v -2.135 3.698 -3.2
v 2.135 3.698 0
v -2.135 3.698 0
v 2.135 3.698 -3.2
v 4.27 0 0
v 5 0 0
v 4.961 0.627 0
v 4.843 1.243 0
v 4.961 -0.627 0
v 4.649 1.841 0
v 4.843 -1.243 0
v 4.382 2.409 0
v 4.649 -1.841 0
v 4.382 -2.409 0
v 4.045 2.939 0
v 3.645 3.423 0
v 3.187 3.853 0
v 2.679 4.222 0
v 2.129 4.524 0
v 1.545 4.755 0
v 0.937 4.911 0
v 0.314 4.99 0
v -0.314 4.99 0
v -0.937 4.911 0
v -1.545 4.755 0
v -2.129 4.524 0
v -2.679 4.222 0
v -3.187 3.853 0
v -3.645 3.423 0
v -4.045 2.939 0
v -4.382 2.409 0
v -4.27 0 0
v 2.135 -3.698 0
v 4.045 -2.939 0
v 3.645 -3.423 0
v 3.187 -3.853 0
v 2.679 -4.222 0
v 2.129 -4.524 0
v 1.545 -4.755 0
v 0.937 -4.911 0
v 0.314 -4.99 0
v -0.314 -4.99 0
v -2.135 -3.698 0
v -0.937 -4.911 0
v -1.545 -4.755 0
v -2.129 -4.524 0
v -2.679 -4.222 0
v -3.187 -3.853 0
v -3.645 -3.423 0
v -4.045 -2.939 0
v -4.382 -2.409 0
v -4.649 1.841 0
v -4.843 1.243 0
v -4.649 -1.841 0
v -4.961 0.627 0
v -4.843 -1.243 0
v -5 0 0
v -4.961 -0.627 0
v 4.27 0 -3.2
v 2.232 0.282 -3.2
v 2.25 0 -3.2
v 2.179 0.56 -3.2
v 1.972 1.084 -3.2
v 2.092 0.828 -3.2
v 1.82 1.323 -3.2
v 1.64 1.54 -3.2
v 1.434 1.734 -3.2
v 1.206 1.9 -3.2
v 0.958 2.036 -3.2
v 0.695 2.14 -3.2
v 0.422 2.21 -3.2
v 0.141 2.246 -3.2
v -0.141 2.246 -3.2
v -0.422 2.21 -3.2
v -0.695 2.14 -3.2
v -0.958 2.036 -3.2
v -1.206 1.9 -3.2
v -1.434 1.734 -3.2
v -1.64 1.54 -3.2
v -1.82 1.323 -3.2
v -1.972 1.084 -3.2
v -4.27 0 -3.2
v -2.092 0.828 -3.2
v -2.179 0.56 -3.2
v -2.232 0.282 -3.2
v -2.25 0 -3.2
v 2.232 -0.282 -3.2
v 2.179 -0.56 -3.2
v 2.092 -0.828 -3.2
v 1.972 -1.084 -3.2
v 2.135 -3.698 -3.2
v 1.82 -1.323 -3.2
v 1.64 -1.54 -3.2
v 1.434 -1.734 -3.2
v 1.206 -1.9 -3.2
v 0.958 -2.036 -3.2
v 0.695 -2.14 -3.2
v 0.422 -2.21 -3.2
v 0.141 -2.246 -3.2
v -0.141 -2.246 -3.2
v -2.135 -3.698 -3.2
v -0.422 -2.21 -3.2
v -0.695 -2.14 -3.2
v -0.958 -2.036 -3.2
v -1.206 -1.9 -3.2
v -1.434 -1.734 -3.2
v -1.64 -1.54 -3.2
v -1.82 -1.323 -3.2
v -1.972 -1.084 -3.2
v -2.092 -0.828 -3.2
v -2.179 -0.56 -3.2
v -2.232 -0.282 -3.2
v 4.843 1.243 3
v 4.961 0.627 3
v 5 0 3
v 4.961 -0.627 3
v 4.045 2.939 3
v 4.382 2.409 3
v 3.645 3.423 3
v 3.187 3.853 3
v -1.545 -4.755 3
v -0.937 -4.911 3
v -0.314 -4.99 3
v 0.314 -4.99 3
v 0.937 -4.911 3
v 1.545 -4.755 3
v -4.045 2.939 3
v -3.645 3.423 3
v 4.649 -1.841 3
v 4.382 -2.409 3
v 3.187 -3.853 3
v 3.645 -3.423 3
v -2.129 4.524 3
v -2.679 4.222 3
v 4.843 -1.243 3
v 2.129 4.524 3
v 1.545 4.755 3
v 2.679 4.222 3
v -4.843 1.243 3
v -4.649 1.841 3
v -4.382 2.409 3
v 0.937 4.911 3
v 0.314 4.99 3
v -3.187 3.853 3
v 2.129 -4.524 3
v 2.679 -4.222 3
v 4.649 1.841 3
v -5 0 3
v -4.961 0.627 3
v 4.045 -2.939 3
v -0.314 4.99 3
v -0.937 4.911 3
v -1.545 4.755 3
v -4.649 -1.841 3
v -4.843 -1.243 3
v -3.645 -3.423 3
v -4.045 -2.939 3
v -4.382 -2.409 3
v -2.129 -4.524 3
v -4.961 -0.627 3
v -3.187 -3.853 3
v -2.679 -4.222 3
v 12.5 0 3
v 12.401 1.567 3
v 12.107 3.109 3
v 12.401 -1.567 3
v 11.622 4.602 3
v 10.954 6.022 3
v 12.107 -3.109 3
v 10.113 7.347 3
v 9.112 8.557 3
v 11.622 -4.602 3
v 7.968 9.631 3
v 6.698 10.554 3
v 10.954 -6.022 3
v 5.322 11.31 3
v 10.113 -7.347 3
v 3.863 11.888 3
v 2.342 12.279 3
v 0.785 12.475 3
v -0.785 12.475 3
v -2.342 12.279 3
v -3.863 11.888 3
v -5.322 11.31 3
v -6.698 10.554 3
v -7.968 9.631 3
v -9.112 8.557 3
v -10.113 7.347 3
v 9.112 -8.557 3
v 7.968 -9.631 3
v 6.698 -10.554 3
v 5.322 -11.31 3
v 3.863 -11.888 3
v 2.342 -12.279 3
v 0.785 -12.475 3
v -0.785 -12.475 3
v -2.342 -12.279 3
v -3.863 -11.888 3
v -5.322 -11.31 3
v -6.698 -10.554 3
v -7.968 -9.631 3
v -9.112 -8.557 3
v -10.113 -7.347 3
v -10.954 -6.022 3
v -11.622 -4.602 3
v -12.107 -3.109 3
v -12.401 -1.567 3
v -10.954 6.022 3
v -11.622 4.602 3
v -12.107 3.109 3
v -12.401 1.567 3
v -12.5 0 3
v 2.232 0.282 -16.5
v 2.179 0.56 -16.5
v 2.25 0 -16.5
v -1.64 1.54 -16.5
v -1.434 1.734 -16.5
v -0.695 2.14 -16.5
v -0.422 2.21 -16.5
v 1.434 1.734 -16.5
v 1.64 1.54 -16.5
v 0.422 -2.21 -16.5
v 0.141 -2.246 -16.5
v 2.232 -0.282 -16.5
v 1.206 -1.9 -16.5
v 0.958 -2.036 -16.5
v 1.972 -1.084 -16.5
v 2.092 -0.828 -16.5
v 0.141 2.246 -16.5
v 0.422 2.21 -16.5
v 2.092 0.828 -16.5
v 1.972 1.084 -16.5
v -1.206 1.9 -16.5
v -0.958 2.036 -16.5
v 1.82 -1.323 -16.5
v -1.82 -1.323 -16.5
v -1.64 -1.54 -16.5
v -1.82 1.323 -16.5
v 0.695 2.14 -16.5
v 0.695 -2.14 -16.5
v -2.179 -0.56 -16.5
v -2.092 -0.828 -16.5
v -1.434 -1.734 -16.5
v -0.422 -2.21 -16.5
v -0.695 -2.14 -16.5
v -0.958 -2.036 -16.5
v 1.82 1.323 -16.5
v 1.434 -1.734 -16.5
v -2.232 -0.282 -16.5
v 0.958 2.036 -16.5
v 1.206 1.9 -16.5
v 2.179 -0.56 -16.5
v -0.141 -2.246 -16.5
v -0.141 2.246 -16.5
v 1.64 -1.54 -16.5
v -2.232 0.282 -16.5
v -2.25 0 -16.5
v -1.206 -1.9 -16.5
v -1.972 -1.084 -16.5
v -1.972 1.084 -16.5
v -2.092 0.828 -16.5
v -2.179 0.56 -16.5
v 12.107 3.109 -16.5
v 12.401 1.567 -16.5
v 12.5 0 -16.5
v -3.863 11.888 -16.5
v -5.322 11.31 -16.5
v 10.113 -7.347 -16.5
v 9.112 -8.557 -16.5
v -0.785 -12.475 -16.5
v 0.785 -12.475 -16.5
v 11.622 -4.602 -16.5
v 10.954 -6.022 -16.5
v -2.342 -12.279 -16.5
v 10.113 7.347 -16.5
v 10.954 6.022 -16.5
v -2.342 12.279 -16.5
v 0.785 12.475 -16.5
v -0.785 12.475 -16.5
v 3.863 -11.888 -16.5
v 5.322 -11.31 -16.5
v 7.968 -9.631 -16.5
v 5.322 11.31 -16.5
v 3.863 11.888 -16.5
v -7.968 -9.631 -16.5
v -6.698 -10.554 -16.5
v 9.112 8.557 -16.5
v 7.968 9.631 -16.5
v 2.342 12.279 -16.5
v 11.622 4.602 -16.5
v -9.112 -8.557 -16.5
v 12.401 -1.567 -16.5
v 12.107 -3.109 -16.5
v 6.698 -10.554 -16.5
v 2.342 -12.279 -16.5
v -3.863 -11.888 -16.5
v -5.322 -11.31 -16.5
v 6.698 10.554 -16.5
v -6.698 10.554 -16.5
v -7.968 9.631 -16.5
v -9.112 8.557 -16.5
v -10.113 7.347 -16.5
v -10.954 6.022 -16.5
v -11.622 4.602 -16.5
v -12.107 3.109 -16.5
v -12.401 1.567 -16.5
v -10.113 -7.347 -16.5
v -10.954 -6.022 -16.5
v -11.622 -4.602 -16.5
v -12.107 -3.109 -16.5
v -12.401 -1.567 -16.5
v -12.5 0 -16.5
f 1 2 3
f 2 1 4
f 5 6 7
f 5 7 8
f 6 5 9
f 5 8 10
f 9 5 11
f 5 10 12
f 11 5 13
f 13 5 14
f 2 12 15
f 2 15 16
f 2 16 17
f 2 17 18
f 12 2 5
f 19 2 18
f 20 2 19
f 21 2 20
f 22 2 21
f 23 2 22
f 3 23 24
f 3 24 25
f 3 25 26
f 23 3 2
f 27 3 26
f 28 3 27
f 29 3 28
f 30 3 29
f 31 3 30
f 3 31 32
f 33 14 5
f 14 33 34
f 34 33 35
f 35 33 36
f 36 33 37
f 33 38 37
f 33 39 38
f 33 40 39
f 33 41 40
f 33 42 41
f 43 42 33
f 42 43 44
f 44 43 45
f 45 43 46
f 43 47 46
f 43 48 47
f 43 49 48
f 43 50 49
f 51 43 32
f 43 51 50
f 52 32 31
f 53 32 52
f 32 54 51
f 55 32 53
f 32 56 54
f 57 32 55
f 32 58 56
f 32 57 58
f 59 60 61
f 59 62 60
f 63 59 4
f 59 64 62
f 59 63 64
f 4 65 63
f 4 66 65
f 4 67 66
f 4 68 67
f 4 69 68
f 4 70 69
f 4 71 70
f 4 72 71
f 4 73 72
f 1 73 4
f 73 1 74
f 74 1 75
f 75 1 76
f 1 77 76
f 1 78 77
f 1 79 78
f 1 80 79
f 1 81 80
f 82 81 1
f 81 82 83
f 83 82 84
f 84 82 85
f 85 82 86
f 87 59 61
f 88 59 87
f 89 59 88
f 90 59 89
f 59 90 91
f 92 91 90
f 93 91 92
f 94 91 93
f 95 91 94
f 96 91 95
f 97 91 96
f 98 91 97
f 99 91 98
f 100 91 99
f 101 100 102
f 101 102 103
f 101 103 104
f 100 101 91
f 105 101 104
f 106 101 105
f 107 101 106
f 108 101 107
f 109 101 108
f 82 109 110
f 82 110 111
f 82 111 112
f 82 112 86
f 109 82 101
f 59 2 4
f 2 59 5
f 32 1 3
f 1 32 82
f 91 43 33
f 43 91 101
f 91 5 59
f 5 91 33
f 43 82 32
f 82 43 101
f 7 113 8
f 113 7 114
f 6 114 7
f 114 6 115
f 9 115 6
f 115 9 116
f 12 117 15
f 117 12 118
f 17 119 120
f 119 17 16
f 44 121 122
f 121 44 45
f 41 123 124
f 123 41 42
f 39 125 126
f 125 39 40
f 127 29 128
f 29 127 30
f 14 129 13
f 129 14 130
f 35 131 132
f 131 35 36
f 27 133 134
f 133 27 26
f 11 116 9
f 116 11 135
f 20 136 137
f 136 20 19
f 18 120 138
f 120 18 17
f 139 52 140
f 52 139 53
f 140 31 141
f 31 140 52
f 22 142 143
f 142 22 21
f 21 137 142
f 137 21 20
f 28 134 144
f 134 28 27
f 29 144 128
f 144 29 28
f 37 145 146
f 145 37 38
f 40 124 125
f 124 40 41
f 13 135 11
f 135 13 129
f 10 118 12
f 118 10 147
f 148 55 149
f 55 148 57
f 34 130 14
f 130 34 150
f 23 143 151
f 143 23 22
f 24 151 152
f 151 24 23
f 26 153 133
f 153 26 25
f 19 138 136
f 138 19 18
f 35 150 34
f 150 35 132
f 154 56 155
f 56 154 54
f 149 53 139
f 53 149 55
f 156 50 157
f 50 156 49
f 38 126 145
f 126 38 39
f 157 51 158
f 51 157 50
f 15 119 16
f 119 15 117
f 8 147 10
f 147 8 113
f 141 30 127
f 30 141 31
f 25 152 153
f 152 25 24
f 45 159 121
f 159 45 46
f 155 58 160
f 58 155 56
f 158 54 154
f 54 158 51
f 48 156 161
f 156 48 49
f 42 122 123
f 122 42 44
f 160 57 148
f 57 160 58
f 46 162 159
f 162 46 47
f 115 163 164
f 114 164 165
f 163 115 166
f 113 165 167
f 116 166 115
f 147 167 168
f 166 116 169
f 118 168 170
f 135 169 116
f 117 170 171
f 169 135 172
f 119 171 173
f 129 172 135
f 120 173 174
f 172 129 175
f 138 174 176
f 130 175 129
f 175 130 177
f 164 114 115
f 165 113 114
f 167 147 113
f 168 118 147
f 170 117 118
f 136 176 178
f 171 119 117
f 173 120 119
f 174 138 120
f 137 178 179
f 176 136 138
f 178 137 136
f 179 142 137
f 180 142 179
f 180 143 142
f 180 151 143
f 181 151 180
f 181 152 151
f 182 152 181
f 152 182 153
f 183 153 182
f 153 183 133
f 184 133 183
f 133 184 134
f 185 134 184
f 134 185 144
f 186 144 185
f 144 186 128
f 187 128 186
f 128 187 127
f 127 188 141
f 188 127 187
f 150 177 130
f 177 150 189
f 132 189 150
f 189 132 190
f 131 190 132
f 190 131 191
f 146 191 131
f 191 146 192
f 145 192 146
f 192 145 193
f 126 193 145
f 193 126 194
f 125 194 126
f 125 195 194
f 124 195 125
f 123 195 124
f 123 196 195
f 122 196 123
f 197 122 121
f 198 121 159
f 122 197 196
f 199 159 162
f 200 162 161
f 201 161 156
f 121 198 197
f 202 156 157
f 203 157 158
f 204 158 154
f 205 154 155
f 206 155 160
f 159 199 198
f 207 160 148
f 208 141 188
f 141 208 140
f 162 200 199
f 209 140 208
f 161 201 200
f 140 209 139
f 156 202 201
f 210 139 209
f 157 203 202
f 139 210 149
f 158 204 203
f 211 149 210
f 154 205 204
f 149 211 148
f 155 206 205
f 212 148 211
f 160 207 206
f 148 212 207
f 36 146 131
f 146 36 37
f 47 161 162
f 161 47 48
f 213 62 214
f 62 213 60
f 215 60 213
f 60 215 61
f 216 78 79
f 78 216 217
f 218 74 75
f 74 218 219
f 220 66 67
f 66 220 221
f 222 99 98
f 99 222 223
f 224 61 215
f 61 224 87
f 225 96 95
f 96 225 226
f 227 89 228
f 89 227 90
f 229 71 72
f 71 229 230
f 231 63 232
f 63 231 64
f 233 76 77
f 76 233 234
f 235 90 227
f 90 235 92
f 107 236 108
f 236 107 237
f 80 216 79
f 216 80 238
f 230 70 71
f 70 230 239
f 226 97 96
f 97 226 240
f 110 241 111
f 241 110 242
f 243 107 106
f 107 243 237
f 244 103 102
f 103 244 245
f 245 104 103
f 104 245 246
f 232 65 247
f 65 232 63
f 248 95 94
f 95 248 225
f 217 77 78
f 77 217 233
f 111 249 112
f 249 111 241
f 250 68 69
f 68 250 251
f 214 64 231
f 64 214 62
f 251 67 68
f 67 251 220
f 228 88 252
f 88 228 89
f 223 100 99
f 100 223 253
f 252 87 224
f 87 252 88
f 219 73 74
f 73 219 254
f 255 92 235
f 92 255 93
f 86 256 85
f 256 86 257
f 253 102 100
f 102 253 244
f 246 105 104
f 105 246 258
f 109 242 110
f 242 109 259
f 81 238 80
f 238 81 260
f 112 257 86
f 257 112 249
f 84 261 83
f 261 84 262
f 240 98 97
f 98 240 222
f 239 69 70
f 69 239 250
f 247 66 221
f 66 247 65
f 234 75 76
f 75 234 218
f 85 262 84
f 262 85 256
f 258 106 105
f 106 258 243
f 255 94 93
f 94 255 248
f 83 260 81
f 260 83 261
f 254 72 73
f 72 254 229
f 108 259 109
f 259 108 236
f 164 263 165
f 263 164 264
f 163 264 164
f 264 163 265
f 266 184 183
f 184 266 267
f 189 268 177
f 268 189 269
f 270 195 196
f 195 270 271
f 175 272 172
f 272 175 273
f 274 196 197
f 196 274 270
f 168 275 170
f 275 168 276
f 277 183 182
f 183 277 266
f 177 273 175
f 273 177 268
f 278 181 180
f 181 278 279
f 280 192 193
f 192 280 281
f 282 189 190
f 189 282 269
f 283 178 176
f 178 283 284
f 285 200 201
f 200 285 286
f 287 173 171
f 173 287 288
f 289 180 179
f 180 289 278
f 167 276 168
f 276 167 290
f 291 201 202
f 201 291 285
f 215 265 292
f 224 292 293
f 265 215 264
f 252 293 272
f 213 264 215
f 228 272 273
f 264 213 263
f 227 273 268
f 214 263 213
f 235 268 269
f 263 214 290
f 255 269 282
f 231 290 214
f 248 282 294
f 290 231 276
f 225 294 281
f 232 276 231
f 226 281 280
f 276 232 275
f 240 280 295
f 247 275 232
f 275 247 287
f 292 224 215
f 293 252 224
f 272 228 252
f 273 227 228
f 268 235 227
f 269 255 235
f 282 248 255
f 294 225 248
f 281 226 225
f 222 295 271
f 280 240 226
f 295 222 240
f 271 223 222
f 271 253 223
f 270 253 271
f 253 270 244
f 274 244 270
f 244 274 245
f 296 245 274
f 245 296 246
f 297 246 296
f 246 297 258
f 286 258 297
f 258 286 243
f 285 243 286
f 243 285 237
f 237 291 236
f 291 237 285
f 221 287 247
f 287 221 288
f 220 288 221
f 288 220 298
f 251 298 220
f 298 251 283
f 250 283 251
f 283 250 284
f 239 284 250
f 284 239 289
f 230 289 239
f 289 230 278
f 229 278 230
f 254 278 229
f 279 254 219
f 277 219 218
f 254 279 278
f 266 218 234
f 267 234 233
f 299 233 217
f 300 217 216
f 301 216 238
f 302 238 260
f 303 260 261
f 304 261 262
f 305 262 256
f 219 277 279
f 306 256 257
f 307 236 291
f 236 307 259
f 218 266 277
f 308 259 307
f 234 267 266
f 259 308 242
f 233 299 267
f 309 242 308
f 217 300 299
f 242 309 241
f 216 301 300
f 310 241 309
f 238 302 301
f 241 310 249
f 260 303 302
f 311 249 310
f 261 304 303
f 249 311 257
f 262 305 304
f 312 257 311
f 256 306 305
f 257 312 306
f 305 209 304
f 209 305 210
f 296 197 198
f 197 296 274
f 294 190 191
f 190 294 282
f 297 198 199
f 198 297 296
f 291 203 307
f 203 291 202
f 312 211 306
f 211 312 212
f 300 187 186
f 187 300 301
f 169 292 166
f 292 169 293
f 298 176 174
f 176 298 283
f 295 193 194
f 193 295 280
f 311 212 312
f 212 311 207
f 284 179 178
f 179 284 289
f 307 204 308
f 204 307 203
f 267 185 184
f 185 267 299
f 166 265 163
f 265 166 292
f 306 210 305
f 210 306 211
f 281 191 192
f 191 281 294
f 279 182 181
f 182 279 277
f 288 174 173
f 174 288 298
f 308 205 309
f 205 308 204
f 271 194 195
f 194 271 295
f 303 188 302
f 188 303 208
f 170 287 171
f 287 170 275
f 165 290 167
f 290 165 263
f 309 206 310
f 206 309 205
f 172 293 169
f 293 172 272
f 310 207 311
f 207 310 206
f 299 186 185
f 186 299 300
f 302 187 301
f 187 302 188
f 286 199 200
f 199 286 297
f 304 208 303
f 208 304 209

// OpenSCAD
$fn = 50;

difference() {
	union() {
		translate(v = [0, 0, -16.5]) {
			cylinder(h = 19.5, r = 12.5);
		}
	}
	union() {
		translate(v = [0, 0, 0]) {
			rotate(a = [0, 0, 0]) {
				difference() {
					union() {
						translate(v = [0, 0, -3.2]) {
							linear_extrude(height = 3.2) {
								polygon(points = [[4.2698, 0.0], [2.1349000000000005, 3.697755269078796], [-2.134899999999999, 3.6977552690787965], [-4.2698, 5.228996902999369e-16], [-2.134900000000002, -3.6977552690787956], [2.1348999999999974, -3.697755269078798]]);
							}
						}
					}
					union();
				}
			}
		}
		#cylinder(h = 3, r = 5.0);
		#translate(v = [0, 0, -100.0]) {
			cylinder(h = 200, r = 2.25);
		}
	}
}
